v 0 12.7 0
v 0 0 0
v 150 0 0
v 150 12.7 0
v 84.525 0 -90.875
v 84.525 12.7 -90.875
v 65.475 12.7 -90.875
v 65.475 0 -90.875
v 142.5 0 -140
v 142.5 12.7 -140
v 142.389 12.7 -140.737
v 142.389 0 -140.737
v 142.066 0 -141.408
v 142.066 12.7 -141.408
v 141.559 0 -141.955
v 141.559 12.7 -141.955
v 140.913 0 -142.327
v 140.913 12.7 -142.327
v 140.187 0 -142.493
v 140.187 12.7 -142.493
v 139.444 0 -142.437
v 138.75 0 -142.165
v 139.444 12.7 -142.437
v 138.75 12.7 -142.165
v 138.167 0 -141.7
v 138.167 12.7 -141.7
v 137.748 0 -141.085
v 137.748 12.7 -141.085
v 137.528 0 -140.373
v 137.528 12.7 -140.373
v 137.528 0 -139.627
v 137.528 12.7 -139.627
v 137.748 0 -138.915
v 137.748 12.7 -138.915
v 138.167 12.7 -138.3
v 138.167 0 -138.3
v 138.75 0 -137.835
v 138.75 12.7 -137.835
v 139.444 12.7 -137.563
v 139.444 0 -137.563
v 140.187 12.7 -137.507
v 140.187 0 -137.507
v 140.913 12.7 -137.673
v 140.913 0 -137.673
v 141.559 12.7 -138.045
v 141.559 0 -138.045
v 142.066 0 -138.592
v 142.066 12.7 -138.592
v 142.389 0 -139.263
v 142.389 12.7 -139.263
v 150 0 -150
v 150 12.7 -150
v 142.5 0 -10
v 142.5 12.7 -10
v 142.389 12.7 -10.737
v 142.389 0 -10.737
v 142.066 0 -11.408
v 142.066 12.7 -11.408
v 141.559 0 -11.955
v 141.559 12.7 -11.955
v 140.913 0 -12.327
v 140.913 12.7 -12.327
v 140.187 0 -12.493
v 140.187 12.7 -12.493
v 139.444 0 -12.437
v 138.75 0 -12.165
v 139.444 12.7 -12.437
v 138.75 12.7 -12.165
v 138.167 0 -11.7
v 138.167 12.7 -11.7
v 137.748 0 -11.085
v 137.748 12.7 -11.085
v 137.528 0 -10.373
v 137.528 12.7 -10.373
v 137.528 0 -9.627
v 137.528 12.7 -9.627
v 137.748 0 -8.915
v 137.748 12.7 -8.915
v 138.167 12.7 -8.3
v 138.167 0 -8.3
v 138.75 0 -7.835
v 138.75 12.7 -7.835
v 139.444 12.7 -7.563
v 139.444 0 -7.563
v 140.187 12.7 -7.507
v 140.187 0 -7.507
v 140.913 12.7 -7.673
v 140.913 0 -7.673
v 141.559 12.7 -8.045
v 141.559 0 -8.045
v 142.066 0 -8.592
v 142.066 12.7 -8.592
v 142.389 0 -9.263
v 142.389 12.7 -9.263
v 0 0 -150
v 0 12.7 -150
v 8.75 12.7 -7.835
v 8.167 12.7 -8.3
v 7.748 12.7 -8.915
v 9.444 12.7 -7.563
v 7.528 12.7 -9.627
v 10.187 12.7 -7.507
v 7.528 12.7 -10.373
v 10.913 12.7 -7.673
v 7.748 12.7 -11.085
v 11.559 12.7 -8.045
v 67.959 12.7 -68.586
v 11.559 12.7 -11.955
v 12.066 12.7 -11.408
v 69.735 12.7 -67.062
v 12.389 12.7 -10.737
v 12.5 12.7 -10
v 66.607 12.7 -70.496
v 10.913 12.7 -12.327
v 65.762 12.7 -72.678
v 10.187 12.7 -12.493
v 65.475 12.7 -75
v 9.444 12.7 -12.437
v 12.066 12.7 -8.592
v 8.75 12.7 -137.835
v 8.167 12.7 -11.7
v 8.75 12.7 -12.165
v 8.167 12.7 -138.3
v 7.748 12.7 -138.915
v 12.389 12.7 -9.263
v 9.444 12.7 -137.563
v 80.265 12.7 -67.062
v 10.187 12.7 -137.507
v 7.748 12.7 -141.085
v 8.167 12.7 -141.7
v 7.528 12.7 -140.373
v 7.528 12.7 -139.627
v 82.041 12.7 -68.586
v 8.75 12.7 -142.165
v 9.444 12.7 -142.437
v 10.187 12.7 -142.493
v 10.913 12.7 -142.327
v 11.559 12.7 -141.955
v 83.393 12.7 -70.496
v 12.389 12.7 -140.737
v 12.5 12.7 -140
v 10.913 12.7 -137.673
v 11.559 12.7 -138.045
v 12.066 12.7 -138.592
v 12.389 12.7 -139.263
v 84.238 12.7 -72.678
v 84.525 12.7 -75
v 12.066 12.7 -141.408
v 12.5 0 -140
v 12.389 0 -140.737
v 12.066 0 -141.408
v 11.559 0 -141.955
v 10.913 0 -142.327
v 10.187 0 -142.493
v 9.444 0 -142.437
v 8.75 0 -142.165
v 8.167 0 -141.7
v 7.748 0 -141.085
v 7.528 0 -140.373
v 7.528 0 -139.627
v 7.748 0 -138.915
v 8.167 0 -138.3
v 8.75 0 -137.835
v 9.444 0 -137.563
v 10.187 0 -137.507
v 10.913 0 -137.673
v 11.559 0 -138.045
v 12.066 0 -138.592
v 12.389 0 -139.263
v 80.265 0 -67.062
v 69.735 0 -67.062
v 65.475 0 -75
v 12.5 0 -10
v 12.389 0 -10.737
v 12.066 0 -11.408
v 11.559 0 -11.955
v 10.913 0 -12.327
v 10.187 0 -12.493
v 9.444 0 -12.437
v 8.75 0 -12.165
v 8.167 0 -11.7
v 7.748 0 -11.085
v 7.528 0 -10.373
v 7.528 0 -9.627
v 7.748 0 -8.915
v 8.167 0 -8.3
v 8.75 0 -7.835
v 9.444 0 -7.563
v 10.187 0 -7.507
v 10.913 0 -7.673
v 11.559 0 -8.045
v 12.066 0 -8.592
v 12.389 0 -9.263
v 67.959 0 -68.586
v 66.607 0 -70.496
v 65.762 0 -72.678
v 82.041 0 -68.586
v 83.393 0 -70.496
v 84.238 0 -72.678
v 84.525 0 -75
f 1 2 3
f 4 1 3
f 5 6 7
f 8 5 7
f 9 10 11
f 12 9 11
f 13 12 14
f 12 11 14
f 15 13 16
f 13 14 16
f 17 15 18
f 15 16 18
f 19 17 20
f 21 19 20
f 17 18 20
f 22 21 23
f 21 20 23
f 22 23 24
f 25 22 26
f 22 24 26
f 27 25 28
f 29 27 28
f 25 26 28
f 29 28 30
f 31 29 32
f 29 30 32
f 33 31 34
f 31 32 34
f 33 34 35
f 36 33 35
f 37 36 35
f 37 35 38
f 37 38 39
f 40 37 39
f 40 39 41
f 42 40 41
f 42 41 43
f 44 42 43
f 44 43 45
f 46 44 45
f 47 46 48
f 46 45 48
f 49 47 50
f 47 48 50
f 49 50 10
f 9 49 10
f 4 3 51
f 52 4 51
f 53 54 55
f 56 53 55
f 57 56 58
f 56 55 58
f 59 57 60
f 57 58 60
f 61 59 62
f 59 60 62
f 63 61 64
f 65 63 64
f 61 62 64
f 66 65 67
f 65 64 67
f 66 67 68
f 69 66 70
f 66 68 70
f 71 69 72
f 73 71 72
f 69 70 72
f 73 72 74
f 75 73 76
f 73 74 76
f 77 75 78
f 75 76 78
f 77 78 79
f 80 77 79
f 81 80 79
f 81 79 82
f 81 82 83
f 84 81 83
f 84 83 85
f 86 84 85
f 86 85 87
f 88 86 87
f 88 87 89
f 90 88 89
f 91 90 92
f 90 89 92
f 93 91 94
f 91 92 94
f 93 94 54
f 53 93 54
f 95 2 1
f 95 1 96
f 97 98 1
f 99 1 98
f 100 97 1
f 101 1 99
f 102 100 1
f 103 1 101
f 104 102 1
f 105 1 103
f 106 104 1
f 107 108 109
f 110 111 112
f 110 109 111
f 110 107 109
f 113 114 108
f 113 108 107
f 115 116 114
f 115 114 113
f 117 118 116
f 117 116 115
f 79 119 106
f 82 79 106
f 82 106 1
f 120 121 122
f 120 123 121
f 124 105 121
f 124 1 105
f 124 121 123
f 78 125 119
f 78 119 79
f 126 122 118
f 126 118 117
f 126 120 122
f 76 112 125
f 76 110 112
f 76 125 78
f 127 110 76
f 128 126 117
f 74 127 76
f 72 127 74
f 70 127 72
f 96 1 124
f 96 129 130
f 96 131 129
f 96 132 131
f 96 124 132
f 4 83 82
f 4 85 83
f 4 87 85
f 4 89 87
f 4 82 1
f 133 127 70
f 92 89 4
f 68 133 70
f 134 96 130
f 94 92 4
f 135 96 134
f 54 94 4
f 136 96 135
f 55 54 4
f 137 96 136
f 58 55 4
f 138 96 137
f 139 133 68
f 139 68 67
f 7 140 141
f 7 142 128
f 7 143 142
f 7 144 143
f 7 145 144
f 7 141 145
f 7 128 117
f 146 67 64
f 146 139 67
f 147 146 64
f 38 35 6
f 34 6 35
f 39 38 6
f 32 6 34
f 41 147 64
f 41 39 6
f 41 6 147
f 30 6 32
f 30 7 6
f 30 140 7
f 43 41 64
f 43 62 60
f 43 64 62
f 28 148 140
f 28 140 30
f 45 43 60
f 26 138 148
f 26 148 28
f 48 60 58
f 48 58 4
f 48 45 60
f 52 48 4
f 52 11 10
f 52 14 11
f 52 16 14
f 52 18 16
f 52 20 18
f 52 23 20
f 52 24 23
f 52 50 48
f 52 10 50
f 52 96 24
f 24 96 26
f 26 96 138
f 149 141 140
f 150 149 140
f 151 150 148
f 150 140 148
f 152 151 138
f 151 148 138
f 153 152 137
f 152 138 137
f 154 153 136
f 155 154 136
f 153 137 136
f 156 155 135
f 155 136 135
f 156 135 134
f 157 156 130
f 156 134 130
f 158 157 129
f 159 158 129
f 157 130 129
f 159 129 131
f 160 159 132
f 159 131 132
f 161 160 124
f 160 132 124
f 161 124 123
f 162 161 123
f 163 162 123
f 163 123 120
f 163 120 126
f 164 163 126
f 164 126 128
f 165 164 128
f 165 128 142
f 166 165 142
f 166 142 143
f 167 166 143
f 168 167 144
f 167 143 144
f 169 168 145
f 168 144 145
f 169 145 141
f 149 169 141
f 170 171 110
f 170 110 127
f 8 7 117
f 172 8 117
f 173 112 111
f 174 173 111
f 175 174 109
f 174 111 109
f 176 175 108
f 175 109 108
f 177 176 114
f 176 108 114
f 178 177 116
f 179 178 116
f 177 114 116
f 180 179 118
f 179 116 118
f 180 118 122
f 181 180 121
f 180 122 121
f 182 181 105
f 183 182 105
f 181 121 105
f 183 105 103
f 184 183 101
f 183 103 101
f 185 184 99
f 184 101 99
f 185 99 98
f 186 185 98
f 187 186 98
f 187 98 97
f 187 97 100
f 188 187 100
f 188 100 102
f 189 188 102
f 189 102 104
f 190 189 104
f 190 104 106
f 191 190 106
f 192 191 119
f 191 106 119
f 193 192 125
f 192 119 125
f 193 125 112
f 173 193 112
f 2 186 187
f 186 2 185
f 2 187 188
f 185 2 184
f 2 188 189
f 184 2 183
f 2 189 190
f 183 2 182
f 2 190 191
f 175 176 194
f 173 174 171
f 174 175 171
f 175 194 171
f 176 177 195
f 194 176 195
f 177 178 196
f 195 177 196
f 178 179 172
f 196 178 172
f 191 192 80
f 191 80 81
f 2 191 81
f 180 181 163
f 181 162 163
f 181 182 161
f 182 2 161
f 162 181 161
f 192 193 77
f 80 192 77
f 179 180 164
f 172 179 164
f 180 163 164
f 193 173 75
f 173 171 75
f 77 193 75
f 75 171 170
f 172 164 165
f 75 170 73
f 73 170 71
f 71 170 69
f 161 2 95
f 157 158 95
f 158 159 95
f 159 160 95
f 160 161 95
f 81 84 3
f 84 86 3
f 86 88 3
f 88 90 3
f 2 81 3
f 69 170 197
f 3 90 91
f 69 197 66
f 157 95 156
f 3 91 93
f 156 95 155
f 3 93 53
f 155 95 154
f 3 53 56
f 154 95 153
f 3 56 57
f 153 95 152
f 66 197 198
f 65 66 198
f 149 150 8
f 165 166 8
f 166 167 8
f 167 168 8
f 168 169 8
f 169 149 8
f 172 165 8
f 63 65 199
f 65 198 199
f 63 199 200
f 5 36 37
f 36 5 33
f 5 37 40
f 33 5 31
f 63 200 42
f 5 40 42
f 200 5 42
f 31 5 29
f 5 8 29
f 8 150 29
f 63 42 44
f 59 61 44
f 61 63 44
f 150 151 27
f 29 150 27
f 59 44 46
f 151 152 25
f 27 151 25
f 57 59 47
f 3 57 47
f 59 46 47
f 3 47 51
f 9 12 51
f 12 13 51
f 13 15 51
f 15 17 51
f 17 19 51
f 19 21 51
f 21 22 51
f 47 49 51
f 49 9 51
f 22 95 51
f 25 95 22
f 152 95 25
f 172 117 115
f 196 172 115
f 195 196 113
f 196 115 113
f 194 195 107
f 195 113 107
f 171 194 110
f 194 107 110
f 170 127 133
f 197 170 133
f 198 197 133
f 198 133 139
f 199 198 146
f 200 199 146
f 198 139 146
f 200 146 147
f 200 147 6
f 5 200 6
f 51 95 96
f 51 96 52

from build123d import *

# Parameters (mm, degrees)
SKETCH1_W           = 150
SKETCH1_H           = 150
BOSS_EXTRUDE1_DEPTH = 12.7
SKETCH2_W           = 10.53028371
SKETCH2_H           = 7.9375
SKETCH2_R           = 2.5
CUT_EXTRUDE1_DEPTH  = 12.7


with BuildPart() as part:
    # Sketch1 → Boss-Extrude1 (new body)
    with BuildSketch(Plane(origin=(0, 0, 0), x_dir=(1, 0, 0), z_dir=(0, 1, 0))):
        with Locations((75, 75)):
            Rectangle(SKETCH1_W, SKETCH1_H)
    extrude(amount=BOSS_EXTRUDE1_DEPTH)

    # Sketch2 → Cut-Extrude1 (cut)
    with BuildSketch(Plane(origin=(0, 12.7, 0), x_dir=(1, 0, 0), z_dir=(0, 1, 0))):
        with BuildLine():
            ThreePointArc((80.265141855, 82.9375), (83.392737967, 79.504173), (84.525, 75))
            Line((84.525, 75), (84.525, 90.875))
            Line((84.525, 90.875), (65.475, 90.875))
            Line((65.475, 90.875), (65.475, 75))
            ThreePointArc((65.475, 75), (66.607262033, 79.504173), (69.734858145, 82.9375))
            ThreePointArc((69.734858145, 82.9375), (75, 84.525), (80.265141855, 82.9375))
        make_face()
        with BuildLine():
            ThreePointArc((80.265141855, 67.0625), (83.392737967, 70.495827), (84.525, 75))
            Line((84.525, 75), (80.265141855, 75))
            Line((80.265141855, 75), (80.265141855, 67.0625))
        make_face()
        with BuildLine():
            Line((80.265141855, 75), (84.525, 75))
            ThreePointArc((84.525, 75), (83.392737967, 79.504173), (80.265141855, 82.9375))
            Line((80.265141855, 82.9375), (80.265141855, 75))
        make_face()
        with BuildLine():
            Line((69.734858145, 67.0625), (69.734858145, 75))
            Line((69.734858145, 75), (65.475, 75))
            ThreePointArc((65.475, 75), (66.607262033, 70.495827), (69.734858145, 67.0625))
        make_face()
        with BuildLine():
            Line((65.475, 75), (69.734858145, 75))
            Line((69.734858145, 75), (69.734858145, 82.9375))
            ThreePointArc((69.734858145, 82.9375), (66.607262033, 79.504173), (65.475, 75))
        make_face()
        with Locations((75, 78.96875)):
            Rectangle(SKETCH2_W, SKETCH2_H)
        with BuildLine():
            Line((69.734858145, 82.9375), (80.265141855, 82.9375))
            ThreePointArc((80.265141855, 82.9375), (75, 84.525), (69.734858145, 82.9375))
        make_face()
        with Locations((75, 71.03125)):
            Rectangle(SKETCH2_W, SKETCH2_H)
        with Locations((10, 140)):
            Circle(SKETCH2_R)
        with Locations((140, 140)):
            Circle(SKETCH2_R)
        with Locations((140, 10)):
            Circle(SKETCH2_R)
        with Locations((10, 10)):
            Circle(SKETCH2_R)
    extrude(amount=-CUT_EXTRUDE1_DEPTH, mode=Mode.SUBTRACT)


solid = part.part
